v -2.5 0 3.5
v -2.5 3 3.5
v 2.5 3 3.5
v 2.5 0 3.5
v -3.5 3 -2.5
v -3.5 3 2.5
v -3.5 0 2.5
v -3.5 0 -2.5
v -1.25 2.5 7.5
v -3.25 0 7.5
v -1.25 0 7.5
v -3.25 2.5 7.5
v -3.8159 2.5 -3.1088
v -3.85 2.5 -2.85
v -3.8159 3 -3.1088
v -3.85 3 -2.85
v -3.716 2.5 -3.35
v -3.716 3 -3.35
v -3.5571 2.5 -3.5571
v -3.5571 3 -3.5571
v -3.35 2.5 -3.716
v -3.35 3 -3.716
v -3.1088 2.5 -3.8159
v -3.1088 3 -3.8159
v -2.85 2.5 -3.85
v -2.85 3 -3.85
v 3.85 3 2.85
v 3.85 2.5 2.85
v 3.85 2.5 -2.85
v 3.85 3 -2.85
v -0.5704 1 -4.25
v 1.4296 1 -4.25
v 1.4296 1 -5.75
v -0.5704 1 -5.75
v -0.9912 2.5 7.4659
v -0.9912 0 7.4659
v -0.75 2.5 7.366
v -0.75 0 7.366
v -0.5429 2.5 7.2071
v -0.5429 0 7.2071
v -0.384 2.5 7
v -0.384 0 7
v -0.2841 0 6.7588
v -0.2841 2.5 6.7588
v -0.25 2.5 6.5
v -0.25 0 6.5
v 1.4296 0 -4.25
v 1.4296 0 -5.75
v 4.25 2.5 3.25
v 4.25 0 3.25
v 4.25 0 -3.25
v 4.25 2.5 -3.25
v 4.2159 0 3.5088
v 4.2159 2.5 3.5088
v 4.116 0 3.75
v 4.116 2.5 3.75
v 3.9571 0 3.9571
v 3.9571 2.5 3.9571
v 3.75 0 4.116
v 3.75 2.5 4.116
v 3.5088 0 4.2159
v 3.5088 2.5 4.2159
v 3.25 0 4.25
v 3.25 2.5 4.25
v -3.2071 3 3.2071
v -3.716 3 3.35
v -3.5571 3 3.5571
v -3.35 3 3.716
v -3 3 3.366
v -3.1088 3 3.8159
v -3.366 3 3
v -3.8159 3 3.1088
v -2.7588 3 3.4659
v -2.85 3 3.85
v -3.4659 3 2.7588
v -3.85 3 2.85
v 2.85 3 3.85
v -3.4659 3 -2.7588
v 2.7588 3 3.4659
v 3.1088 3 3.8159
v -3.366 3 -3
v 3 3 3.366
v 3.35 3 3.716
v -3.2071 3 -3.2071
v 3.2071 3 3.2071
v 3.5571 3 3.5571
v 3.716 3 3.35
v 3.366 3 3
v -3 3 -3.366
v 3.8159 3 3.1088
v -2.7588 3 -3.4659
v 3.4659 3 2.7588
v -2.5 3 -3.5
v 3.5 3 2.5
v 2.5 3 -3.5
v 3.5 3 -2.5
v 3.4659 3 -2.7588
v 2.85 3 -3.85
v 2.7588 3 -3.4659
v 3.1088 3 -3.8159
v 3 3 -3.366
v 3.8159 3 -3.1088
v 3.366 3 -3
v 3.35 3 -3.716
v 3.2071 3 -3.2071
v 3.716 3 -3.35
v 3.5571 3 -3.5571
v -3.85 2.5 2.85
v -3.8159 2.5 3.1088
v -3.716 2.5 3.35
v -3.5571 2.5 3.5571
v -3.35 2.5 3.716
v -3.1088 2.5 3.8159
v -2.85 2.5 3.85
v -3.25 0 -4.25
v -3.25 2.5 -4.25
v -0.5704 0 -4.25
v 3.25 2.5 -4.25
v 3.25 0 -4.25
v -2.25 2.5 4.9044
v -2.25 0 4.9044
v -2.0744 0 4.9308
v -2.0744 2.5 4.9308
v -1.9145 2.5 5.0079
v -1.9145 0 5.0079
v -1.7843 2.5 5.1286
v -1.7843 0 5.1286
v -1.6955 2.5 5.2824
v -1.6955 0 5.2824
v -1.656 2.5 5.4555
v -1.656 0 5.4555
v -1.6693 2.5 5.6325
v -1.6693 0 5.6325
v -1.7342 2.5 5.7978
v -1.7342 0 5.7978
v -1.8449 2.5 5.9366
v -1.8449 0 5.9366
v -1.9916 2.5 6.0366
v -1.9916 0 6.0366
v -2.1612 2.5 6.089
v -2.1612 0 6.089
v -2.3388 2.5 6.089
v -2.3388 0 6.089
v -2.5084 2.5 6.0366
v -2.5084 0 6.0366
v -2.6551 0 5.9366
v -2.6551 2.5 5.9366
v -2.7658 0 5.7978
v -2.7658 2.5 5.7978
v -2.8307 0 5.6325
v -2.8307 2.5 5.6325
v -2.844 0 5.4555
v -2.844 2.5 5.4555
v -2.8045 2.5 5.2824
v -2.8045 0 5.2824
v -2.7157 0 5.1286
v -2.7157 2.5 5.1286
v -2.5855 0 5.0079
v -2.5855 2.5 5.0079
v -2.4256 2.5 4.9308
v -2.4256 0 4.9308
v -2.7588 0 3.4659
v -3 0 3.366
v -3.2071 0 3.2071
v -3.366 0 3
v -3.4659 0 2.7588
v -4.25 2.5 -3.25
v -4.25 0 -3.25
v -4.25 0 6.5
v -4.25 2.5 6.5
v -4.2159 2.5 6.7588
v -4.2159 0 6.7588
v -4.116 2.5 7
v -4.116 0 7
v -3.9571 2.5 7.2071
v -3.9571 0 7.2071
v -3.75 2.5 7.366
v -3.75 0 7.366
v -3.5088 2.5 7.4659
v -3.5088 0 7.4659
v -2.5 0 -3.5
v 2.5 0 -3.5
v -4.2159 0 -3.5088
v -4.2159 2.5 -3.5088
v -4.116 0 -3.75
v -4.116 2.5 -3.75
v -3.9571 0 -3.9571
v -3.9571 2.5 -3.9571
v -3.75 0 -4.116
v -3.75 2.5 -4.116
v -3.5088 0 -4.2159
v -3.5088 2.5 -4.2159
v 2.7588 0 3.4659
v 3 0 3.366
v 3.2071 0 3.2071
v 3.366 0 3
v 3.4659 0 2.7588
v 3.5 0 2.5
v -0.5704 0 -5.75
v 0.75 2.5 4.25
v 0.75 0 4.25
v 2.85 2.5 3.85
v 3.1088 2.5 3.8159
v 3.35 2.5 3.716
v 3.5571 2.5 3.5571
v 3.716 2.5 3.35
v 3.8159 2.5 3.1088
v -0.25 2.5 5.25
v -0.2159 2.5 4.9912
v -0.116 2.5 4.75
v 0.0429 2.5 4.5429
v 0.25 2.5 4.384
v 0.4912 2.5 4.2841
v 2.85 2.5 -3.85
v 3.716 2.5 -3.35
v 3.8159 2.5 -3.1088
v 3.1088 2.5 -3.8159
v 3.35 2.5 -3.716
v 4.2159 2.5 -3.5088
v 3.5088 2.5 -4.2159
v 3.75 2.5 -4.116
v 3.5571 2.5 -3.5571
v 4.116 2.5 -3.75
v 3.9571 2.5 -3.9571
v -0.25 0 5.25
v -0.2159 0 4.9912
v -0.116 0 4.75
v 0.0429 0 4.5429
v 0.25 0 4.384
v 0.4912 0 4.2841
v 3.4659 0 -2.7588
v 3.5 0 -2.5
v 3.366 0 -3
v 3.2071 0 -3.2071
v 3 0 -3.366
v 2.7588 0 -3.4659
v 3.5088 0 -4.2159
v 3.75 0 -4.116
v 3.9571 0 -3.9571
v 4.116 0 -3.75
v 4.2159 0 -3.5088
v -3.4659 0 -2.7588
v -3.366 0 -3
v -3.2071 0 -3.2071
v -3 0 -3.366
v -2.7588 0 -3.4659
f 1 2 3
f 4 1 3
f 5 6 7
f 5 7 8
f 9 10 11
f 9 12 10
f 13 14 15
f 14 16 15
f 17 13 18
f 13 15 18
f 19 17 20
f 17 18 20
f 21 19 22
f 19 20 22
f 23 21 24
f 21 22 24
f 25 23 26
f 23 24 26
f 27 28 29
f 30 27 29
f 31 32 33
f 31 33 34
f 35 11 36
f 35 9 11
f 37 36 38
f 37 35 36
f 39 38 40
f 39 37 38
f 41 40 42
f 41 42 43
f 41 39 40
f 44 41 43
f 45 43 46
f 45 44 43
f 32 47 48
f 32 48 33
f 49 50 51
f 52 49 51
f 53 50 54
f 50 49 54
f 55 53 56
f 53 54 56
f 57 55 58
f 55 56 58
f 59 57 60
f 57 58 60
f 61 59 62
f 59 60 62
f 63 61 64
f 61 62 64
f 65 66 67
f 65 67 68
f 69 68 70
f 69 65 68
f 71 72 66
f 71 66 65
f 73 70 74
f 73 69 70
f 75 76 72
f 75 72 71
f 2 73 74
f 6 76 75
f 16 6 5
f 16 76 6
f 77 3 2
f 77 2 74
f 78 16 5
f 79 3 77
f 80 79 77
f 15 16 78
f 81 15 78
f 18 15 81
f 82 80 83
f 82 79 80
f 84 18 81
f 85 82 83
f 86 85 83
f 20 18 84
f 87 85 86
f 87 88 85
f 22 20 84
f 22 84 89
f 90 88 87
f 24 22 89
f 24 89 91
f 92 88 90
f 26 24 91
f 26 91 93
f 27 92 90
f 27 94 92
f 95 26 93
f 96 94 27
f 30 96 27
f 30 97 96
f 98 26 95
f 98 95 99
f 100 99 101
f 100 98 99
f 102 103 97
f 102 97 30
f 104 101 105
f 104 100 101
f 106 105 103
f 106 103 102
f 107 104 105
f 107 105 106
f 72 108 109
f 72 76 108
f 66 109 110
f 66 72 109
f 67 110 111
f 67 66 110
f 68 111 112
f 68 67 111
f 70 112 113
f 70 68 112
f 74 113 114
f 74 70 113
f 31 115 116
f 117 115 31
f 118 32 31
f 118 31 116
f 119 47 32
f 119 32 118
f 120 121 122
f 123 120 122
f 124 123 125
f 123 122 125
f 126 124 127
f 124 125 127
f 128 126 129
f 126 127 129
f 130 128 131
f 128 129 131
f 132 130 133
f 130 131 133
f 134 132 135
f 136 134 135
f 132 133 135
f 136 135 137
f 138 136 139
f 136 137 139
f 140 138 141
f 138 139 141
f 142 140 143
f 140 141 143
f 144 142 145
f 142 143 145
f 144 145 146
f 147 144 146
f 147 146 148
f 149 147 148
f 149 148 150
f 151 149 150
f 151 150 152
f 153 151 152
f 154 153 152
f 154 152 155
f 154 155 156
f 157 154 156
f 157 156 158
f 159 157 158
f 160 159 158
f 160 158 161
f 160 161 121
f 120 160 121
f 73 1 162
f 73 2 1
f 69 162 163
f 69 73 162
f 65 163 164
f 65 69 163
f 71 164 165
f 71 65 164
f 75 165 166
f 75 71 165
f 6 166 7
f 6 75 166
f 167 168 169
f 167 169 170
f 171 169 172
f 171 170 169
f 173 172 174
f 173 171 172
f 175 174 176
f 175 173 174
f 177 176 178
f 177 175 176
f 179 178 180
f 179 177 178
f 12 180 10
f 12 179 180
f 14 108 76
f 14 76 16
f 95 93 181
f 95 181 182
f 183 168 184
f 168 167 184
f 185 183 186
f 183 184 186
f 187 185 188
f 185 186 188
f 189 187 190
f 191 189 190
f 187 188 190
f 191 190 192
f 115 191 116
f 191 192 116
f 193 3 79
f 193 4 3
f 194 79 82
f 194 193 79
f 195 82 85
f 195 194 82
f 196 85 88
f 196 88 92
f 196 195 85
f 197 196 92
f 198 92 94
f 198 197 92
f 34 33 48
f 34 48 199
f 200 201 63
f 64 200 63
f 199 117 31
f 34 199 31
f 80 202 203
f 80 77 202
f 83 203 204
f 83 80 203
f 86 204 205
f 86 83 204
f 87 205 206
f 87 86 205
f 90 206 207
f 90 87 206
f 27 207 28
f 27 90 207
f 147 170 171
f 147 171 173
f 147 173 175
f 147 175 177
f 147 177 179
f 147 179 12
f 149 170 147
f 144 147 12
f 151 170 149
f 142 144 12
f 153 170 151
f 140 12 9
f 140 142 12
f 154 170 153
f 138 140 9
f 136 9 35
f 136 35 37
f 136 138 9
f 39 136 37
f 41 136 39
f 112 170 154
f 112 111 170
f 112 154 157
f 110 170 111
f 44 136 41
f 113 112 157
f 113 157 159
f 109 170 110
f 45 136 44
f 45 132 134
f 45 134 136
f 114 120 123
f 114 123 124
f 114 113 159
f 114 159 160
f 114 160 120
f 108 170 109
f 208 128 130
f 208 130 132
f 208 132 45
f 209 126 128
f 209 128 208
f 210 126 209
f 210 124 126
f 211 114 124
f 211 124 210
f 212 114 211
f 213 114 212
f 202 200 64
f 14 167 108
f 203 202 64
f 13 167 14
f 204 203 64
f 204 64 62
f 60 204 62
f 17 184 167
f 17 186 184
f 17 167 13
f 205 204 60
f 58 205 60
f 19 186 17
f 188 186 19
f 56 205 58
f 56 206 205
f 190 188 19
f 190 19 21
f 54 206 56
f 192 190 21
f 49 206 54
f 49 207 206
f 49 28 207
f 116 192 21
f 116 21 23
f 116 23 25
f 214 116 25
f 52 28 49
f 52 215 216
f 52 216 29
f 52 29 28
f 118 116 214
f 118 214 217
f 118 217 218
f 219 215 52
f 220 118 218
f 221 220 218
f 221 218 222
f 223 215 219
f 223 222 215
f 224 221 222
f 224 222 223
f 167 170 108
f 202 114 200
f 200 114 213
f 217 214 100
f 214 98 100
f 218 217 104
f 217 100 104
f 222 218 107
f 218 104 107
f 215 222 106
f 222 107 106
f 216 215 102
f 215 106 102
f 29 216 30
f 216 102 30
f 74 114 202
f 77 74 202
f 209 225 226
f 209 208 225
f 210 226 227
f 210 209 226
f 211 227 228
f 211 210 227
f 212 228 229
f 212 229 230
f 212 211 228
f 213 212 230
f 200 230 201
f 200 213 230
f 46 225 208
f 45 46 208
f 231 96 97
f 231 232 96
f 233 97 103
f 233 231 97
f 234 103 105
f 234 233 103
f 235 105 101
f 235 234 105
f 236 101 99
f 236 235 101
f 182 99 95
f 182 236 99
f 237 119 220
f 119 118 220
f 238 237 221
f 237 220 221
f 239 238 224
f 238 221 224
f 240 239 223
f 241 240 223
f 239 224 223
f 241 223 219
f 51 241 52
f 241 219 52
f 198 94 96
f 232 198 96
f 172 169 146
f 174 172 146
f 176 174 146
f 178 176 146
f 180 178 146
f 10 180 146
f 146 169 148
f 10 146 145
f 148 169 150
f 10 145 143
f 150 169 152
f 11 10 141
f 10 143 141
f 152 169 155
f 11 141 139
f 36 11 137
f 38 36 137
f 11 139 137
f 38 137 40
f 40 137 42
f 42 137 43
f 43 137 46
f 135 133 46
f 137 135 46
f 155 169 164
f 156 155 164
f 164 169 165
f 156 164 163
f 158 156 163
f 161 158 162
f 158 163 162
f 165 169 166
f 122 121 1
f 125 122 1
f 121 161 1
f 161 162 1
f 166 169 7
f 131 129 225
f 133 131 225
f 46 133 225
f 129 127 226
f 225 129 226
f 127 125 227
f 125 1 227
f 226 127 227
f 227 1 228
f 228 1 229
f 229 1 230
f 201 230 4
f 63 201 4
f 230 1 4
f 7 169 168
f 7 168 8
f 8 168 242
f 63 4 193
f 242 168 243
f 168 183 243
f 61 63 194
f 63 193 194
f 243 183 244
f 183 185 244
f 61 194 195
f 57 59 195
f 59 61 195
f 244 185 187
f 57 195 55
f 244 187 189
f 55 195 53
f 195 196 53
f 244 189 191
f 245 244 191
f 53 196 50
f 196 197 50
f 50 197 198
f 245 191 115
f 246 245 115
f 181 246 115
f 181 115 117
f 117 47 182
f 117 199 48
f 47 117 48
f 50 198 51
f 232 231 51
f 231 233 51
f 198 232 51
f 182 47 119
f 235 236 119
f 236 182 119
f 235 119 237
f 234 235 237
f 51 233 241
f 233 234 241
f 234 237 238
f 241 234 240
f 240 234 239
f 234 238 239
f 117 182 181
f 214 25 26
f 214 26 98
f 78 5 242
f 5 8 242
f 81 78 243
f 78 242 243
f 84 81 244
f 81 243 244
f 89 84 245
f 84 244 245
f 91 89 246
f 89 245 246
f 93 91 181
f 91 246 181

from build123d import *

# Parameters (mm, degrees)
SKETCH1_W             = 8.5
SKETCH1_H             = 8.5
EXTRUDE1_DEPTH        = 2.5
SKETCH15_W            = 7.7
SKETCH15_H            = 7.7
EXTRUDE8_DEPTH        = 0.5
SKETCH3_W             = 4
SKETCH3_H             = 2.5
EXTRUDE3_DEPTH        = 3.25
SKETCH2_W             = 7
SKETCH2_H             = 7
EXTRUDE2_DEPTH        = 1.5
EXTRUDE2_DEPTH_BACK   = 3.5
F_0_80_TAPPED_HOLE1_D = 1.19126
SKETCH11_W            = 2
SKETCH11_H            = 1
EXTRUDE5_DEPTH        = 1.5
FILLET1_R             = 1


with BuildPart() as part:
    # Sketch1 → Extrude1 (new body)
    with BuildSketch(Plane(origin=(0, 0, 0), x_dir=(1, 0, 0), z_dir=(0, 1, 0))):
        Rectangle(SKETCH1_W, SKETCH1_H)
    extrude(amount=EXTRUDE1_DEPTH)

    # Sketch15 → Extrude8 (add)
    with BuildSketch(Plane(origin=(0, 2.5, 0), x_dir=(1, 0, 0), z_dir=(0, 1, 0))):
        Rectangle(SKETCH15_W, SKETCH15_H)
    extrude(amount=EXTRUDE8_DEPTH)

    # Sketch3 → Extrude3 (add)
    with BuildSketch(Plane.XY.offset(4.25)):
        with Locations((-2.25, 1.25)):
            Rectangle(SKETCH3_W, SKETCH3_H)
    extrude(amount=EXTRUDE3_DEPTH)

    # Sketch2 → Extrude2 (cut, two sides)
    with BuildSketch(Plane(origin=(0, 2.5, 0), x_dir=(1, 0, 0), z_dir=(0, 1, 0))) as extrude2_sk:
        Rectangle(SKETCH2_W, SKETCH2_H)
    extrude(amount=EXTRUDE2_DEPTH, mode=Mode.SUBTRACT)
    extrude(extrude2_sk.sketch, amount=-EXTRUDE2_DEPTH_BACK, mode=Mode.SUBTRACT)

    # #0-80 Tapped Hole1 (through all)
    with Locations(Plane(origin=(-2.25, 2.5, 5.5), x_dir=(0, 0, 1), z_dir=(0, 1, 0))):
        with Locations((0, 0)):
            Hole(F_0_80_TAPPED_HOLE1_D / 2)

    # Sketch11 → Extrude5 (add)
    with BuildSketch(Plane(origin=(0, 0, -4.25), x_dir=(-1, 0, 0), z_dir=(0, 0, -1))):
        with Locations((-0.42960296, 0.5)):
            Rectangle(SKETCH11_W, SKETCH11_H)
    extrude(amount=EXTRUDE5_DEPTH)

    # Fillet1
    fillet1_edges = [part.edges().sort_by_distance(p)[0] for p in [
        (3.5, 1.5, -3.5),
        (-3.5, 1.5, -3.5),
        (-3.5, 1.5, 3.5),
        (3.5, 1.5, 3.5),
        (-4.25, 1.25, 7.5),
        (-0.25, 1.25, 7.5),
        (-0.25, 1.25, 4.25),
        (4.25, 1.25, 4.25),
        (4.25, 1.25, -4.25),
        (-4.25, 1.25, -4.25),
        (-3.85, 2.75, 3.85),
        (-3.85, 2.75, -3.85),
        (3.85, 2.75, -3.85),
        (3.85, 2.75, 3.85),
    ]]
    fillet(fillet1_edges, radius=FILLET1_R)


solid = part.part
